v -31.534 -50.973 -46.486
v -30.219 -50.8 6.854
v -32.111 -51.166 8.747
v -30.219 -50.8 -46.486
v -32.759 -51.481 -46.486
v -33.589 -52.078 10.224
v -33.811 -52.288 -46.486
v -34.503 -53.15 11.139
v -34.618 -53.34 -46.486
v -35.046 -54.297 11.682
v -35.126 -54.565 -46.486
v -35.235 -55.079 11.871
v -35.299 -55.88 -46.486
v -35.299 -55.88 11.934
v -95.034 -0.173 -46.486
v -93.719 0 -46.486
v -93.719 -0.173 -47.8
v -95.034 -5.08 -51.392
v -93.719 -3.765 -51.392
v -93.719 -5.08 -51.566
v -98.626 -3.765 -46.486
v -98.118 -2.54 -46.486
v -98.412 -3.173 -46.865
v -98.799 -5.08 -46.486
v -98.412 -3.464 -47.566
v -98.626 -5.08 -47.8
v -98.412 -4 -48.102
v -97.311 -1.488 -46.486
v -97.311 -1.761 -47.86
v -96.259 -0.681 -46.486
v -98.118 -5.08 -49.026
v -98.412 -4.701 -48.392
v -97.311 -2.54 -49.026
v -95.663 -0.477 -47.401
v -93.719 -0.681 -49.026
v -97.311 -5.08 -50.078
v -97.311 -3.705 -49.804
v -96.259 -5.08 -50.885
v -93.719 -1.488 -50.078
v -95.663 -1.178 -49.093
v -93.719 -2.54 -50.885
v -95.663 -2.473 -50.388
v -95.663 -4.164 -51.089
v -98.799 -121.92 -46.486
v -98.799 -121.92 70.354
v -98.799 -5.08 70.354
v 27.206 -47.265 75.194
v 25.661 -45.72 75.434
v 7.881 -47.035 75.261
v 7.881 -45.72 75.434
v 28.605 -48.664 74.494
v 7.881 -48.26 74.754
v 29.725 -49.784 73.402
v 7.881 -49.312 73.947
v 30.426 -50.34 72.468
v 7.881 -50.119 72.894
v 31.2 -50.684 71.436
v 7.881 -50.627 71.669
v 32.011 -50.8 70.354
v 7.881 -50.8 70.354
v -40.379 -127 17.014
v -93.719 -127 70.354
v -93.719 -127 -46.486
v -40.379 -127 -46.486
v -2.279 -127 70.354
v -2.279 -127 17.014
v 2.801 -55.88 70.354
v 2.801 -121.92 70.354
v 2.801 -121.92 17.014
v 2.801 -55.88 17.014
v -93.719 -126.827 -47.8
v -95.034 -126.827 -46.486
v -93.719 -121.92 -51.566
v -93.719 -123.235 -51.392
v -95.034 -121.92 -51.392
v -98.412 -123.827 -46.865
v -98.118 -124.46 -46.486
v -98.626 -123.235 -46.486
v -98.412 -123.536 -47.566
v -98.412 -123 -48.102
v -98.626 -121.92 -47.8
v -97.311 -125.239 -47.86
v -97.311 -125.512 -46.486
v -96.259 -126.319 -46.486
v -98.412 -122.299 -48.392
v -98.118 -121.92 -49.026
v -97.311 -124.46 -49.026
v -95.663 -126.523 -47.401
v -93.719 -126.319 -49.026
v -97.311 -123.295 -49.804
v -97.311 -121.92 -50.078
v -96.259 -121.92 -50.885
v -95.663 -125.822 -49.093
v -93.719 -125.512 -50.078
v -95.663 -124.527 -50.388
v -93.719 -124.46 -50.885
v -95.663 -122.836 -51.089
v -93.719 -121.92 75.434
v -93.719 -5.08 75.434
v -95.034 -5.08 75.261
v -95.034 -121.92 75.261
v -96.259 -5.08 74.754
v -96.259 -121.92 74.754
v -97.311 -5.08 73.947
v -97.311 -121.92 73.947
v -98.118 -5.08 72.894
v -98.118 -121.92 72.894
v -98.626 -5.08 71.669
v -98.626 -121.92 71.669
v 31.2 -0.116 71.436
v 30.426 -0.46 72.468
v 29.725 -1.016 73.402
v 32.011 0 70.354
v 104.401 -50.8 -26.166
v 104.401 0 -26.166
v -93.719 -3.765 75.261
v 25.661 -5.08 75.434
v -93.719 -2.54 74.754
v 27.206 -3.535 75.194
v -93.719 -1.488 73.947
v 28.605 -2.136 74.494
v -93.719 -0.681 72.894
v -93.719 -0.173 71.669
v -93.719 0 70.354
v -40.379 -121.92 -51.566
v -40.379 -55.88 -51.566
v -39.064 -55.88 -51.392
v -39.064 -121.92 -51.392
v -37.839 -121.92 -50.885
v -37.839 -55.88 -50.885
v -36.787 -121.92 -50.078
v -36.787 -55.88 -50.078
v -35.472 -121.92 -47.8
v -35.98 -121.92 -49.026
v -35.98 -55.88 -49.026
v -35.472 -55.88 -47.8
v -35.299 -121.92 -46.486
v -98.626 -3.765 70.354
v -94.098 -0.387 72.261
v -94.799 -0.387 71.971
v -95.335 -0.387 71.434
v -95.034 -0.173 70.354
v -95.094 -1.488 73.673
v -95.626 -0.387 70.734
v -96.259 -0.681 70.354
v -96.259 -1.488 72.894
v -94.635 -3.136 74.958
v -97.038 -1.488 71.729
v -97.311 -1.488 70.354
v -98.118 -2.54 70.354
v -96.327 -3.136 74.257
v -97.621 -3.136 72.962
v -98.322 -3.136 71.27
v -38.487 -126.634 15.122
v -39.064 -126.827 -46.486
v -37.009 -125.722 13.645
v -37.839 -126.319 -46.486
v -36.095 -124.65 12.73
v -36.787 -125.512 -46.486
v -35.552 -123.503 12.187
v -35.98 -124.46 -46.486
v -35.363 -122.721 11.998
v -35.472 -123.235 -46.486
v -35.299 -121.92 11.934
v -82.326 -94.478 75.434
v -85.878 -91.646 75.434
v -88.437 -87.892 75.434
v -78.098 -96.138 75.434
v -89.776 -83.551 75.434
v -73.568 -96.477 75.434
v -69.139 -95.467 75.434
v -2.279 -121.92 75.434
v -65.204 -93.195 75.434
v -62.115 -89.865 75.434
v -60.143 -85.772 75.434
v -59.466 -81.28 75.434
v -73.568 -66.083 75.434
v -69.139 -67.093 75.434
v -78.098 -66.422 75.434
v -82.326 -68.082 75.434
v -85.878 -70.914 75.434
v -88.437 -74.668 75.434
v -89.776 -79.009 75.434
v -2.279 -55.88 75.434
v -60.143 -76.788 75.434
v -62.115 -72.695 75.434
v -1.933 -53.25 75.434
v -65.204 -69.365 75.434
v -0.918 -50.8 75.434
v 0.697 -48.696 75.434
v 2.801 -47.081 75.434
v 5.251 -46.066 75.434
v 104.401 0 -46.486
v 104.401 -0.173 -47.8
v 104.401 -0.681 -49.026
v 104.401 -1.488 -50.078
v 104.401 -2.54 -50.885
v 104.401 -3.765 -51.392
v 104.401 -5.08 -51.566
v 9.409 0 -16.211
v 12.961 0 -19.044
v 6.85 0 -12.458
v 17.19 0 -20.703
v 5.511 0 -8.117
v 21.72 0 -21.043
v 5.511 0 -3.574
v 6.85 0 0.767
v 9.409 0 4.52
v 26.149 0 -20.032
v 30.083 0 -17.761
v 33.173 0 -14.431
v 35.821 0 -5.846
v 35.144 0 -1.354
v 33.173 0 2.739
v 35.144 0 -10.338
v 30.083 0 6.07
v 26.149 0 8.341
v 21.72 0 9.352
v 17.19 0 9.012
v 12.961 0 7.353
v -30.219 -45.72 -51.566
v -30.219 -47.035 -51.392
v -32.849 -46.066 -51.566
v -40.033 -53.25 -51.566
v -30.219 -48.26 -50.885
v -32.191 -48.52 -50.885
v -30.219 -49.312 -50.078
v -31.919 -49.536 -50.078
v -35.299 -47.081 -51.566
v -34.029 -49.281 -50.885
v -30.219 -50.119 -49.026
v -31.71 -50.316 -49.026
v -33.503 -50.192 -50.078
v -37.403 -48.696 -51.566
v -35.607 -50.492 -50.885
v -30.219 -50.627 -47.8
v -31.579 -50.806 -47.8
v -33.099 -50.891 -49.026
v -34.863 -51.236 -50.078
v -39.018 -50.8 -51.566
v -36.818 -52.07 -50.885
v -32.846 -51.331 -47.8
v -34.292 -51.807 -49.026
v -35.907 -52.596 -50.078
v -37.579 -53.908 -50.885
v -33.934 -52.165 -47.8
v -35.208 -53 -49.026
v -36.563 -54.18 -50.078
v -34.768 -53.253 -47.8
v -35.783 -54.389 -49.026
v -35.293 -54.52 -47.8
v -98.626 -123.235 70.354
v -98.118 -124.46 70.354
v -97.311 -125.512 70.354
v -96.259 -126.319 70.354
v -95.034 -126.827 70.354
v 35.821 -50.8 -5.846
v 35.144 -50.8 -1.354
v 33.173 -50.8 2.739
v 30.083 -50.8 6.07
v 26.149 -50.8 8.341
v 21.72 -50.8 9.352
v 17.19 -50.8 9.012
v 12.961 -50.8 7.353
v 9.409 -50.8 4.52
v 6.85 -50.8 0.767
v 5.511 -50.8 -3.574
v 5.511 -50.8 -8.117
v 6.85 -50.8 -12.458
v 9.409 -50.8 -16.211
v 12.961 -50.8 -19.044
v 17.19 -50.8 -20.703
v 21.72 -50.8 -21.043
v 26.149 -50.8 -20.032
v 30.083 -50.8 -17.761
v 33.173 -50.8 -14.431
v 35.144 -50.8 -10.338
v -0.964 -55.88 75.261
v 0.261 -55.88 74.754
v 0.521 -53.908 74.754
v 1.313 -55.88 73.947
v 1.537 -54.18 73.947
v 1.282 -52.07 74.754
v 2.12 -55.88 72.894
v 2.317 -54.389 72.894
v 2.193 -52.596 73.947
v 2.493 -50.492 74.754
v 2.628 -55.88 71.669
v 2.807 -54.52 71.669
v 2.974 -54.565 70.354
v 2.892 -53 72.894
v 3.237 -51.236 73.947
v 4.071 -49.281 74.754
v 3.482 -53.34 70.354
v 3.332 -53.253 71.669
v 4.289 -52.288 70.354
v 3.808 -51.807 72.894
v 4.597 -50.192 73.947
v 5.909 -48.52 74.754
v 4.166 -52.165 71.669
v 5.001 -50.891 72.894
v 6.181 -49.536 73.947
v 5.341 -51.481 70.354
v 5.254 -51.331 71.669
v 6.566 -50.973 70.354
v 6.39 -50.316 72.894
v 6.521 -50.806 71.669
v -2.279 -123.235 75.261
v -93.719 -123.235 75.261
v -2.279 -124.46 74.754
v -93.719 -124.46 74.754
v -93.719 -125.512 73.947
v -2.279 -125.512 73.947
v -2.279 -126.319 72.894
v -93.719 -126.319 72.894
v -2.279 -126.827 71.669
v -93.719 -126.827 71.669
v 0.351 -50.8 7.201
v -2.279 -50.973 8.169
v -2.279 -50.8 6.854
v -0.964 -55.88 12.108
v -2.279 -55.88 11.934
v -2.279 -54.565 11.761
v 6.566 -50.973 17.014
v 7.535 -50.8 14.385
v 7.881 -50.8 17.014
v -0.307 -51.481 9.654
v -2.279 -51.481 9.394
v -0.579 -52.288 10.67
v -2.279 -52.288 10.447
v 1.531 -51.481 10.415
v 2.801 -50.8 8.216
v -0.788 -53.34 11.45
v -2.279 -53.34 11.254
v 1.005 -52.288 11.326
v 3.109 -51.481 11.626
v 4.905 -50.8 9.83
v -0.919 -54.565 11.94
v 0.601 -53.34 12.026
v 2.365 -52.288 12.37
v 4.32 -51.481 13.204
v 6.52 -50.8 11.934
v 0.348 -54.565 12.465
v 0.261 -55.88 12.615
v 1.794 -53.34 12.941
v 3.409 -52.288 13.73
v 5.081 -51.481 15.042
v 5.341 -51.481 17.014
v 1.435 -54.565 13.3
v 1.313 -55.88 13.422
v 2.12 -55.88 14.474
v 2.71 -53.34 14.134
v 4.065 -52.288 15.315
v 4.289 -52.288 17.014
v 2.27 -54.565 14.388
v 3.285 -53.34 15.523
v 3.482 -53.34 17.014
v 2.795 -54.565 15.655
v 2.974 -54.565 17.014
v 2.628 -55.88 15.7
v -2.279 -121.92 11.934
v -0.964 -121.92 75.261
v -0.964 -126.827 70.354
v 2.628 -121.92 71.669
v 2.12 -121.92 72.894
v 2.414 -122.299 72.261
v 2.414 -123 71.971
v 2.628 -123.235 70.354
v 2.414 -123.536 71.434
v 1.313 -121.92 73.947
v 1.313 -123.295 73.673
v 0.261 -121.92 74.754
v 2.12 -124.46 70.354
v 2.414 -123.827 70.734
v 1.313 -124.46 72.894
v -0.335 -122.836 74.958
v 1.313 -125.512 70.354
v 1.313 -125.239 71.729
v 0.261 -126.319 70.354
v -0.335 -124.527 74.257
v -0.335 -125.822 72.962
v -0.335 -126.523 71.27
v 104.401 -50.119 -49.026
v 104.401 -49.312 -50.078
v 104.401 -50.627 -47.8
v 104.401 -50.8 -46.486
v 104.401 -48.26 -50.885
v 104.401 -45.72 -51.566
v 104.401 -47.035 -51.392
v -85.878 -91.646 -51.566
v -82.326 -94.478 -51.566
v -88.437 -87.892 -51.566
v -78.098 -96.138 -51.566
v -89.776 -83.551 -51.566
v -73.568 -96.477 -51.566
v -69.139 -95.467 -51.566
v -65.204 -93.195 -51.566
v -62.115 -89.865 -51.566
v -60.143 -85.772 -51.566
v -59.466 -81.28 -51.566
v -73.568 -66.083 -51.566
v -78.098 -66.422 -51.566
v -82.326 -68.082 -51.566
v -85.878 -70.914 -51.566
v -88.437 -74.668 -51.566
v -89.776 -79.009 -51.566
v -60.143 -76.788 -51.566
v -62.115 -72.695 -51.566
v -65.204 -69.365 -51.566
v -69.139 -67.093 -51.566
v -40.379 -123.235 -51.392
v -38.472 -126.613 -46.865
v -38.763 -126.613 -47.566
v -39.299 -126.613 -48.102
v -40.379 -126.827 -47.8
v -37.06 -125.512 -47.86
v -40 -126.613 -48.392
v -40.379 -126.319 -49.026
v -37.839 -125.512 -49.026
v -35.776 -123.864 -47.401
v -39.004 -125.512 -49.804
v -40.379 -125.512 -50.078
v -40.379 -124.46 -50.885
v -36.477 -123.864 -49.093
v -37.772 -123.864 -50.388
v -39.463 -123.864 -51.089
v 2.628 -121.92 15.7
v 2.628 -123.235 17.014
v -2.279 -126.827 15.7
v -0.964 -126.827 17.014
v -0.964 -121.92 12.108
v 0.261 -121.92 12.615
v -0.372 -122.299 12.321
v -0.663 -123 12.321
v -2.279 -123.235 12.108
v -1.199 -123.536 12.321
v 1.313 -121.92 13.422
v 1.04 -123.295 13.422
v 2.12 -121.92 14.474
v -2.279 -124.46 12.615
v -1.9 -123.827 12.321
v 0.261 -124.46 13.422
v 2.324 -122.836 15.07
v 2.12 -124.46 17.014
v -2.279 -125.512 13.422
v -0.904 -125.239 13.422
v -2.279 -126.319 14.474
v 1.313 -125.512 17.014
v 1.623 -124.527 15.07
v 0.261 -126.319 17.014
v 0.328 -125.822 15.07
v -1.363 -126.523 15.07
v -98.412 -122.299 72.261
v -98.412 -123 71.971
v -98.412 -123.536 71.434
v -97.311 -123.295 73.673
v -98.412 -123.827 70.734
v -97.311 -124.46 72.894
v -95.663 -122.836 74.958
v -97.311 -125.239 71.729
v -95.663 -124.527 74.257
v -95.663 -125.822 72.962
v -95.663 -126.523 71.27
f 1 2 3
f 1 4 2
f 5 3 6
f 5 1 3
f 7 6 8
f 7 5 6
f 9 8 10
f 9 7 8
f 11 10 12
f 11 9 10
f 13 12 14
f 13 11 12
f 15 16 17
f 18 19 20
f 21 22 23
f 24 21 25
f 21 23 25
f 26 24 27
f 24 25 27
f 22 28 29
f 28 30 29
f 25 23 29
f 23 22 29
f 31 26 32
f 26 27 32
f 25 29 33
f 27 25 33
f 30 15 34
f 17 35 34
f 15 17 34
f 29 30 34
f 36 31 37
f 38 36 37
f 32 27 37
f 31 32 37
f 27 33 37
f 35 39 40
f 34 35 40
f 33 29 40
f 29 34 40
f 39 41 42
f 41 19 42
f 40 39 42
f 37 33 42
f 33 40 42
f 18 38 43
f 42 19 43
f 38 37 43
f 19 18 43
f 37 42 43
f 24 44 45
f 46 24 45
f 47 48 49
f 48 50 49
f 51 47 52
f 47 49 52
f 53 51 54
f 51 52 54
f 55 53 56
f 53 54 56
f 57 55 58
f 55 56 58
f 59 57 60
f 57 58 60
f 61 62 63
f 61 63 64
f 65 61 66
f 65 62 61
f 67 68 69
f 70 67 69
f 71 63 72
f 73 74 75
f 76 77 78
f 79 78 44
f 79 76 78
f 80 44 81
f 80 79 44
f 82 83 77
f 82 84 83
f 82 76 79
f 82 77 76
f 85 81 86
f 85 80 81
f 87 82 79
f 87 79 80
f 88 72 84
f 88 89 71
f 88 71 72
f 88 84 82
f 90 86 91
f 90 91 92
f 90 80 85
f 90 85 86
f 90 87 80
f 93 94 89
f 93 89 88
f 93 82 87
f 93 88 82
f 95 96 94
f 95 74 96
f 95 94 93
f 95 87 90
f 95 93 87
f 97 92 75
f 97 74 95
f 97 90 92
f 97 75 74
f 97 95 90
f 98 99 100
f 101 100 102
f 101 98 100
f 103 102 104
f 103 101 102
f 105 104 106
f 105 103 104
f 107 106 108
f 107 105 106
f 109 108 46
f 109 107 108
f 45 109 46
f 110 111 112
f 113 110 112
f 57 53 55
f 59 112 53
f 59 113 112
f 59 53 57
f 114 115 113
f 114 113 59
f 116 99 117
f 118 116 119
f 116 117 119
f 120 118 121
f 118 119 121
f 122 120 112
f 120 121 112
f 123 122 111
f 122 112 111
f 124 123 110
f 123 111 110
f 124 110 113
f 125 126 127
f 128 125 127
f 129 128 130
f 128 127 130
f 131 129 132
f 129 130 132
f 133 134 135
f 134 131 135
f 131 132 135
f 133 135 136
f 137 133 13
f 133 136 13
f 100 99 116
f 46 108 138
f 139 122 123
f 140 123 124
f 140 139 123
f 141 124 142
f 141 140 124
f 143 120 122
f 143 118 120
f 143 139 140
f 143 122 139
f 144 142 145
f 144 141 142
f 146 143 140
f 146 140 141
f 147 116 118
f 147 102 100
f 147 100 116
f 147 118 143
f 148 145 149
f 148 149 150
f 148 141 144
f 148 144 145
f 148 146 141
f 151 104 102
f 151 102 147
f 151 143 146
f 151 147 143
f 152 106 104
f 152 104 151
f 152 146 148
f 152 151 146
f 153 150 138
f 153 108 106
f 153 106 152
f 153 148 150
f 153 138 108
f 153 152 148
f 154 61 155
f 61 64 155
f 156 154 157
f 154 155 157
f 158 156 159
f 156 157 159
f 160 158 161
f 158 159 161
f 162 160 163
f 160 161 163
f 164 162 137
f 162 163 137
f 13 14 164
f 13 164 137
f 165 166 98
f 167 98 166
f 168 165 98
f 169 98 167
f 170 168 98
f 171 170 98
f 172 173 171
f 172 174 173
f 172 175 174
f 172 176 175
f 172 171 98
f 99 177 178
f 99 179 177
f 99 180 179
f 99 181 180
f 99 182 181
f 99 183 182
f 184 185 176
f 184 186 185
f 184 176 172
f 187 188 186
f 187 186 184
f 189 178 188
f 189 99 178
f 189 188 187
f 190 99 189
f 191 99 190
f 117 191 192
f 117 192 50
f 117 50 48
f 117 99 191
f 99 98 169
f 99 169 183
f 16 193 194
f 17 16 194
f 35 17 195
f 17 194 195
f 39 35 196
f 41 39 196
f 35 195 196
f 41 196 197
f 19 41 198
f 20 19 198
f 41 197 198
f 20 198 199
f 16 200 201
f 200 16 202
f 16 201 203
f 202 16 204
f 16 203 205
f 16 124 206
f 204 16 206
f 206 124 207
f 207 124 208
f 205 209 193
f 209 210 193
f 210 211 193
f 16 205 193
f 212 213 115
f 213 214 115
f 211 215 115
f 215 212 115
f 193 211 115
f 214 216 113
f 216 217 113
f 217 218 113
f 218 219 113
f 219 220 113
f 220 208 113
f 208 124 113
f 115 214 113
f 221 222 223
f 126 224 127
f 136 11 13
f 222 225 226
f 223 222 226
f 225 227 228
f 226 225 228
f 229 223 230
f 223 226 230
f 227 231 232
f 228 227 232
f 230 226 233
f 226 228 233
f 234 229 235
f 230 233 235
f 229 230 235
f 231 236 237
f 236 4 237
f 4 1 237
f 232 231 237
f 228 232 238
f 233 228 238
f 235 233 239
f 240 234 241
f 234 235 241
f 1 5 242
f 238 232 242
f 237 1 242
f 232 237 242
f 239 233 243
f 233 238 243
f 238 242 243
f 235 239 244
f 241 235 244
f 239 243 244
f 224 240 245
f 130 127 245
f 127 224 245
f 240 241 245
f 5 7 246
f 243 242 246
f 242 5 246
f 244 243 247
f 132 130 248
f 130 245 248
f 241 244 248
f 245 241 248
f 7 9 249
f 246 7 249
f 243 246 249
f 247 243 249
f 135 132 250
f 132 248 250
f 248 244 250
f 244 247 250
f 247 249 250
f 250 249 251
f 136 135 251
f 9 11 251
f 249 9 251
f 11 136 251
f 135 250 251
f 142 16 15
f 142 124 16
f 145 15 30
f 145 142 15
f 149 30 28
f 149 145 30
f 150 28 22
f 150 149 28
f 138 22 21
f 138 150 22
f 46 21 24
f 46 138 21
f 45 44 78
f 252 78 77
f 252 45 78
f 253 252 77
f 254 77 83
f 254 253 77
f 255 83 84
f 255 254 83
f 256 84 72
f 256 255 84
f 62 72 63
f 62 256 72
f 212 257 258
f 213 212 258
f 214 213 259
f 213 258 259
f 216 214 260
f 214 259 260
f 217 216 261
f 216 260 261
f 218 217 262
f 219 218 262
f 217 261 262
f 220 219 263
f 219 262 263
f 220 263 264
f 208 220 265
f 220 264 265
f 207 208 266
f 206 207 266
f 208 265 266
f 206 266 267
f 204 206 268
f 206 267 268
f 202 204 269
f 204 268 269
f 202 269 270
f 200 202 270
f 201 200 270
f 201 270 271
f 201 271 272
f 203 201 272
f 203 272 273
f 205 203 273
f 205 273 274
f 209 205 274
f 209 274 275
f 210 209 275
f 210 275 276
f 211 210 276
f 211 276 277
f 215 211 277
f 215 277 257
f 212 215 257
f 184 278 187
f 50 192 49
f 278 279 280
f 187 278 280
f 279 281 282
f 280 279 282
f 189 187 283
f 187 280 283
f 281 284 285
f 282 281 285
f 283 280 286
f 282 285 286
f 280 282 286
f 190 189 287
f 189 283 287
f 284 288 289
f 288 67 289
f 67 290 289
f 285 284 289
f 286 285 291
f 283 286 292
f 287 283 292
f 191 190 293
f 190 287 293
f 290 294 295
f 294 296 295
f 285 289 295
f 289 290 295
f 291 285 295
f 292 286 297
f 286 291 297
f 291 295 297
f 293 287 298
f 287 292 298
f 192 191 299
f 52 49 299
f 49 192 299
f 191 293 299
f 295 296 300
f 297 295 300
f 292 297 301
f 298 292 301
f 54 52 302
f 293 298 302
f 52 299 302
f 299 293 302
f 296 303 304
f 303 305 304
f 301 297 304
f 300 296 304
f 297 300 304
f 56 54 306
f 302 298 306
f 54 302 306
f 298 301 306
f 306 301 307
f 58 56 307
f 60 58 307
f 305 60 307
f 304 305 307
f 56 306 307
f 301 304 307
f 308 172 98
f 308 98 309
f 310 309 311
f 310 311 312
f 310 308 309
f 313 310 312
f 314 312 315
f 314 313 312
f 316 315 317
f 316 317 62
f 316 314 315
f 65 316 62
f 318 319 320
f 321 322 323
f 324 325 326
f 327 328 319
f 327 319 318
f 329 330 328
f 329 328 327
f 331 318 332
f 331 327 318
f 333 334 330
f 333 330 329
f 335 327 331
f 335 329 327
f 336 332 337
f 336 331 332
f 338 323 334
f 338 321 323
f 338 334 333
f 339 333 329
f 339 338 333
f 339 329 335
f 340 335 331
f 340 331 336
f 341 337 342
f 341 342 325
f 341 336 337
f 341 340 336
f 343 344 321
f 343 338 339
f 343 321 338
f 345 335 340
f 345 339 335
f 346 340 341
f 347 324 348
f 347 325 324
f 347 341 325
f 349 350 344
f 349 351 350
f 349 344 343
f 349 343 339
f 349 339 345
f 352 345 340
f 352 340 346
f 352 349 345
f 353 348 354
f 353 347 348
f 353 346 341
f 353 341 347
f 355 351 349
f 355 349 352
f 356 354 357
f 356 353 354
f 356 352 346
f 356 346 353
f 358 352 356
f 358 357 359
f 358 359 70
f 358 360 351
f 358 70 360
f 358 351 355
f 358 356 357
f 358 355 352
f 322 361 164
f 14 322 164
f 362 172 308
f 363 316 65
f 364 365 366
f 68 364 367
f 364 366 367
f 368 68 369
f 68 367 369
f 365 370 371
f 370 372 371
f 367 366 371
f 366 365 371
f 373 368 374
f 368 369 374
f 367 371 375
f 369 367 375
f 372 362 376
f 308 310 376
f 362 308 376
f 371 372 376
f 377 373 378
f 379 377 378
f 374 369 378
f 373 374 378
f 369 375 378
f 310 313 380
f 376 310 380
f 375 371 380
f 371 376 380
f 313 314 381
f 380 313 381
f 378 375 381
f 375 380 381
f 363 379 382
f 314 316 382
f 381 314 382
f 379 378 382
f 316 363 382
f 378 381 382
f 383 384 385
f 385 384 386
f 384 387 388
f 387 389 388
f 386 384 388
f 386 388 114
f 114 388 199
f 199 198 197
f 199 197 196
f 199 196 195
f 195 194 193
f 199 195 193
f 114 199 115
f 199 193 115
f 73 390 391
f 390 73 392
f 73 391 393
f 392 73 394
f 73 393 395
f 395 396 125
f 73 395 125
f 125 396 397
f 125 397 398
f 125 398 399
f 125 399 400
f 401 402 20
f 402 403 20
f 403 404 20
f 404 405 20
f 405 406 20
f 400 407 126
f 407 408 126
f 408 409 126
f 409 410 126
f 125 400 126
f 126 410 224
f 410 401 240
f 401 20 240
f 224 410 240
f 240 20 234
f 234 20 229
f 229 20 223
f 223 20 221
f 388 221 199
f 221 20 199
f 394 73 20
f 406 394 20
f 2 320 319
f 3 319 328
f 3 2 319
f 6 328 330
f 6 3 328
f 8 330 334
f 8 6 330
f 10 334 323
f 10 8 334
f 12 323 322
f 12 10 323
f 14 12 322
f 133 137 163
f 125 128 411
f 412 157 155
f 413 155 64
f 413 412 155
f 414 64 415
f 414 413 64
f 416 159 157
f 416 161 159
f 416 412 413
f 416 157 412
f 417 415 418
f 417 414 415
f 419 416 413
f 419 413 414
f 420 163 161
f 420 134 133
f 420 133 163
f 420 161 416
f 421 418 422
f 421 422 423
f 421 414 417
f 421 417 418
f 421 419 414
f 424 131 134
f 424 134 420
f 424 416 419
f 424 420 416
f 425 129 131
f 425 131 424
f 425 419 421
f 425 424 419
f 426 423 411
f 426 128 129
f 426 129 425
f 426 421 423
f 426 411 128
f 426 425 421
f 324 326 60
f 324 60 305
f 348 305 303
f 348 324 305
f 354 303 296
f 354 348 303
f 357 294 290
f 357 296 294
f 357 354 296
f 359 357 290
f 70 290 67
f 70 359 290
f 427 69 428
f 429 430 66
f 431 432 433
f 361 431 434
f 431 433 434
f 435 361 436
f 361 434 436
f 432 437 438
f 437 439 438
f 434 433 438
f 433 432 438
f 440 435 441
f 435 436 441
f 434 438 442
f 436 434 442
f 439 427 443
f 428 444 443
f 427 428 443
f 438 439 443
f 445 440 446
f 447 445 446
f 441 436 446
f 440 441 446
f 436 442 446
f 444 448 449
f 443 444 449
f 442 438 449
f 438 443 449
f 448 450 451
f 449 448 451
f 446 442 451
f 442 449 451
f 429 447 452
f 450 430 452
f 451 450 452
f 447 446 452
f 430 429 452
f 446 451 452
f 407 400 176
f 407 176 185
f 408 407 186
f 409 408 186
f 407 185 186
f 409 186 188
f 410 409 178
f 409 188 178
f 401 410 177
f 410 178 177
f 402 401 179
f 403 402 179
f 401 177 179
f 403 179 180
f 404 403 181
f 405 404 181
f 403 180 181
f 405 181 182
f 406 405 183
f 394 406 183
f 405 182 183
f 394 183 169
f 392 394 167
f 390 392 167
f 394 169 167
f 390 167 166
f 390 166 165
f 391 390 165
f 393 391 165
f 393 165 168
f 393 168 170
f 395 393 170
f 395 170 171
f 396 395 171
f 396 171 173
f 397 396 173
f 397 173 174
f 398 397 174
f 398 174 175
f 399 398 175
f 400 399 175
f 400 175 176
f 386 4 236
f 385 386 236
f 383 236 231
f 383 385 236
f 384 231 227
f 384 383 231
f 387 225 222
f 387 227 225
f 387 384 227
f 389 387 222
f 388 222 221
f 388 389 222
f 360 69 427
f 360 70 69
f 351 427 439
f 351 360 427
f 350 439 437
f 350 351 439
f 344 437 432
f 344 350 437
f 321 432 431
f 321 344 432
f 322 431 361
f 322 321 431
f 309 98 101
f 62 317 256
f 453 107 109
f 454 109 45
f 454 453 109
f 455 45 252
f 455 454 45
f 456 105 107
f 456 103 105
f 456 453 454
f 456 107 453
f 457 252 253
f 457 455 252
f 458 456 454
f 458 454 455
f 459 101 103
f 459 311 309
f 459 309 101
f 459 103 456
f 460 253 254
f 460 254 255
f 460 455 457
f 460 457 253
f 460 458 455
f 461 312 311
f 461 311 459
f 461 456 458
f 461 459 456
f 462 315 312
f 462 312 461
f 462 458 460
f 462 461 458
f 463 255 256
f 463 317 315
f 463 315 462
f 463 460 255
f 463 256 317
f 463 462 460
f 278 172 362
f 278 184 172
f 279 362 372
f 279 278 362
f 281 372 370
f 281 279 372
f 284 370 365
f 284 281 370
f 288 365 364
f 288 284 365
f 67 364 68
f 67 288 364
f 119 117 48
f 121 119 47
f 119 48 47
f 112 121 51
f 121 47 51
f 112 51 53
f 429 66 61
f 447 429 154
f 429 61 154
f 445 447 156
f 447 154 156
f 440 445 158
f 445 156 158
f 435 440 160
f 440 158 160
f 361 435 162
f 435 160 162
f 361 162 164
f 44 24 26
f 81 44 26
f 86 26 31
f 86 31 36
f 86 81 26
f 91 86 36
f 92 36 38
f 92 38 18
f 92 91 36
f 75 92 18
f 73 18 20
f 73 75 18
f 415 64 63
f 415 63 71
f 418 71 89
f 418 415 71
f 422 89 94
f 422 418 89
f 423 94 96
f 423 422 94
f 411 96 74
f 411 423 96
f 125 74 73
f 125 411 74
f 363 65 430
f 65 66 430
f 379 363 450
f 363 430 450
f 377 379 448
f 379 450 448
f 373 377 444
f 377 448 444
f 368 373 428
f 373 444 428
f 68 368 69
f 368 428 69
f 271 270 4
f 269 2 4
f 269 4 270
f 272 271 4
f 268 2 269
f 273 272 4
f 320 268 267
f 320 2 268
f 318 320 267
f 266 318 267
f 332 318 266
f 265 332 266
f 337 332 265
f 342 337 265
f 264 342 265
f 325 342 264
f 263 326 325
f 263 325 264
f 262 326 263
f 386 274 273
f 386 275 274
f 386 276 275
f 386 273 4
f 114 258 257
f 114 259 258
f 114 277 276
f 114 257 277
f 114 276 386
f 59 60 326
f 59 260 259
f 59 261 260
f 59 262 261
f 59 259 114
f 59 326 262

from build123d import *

# Parameters (mm, degrees)
F0_W      = 203.2
F0_H      = 127
F1_DEPTH  = 127
F3_DEPTH  = 76.2
F4_SIZE2  = 101.6
F4_SIZE   = 76.2
F5_R      = 5.08
F6_R      = 15.24
F7_DEPTH  = 50.801
F8_R      = 15.24
F10_DEPTH = 127.001


with BuildPart() as f1:
    # F0 (on Front) → F1 (new body)
    with BuildSketch(Plane.XZ):
        with Locations((2.8009600937, 11.9344207702)):
            Rectangle(F0_W, F0_H)
    extrude(amount=F1_DEPTH)

    # F2 (on face) → F3 (cut)
    with BuildSketch(Plane.XZ.offset(127)):
        Polygon((-35.2990399063, 11.9344207702), (-35.2990399063, -51.5655792298), (104.4009600937, -51.5655792298), (104.4009600937, 75.4344207702), (2.8009600937, 75.4344207702), (2.8009600937, 11.9344207702), align=None)
    extrude(amount=-F3_DEPTH, mode=Mode.SUBTRACT)

    # F4
    f4_edges = [f1.edges().sort_by_distance(p)[0] for p in [
        (104.40096, -25.4, 75.434421),
    ]]
    f4_side = f1.faces().sort_by_distance((-18.970468, -52.614286, 75.434421))[0]
    chamfer(f4_edges, length=F4_SIZE, length2=F4_SIZE2, reference=f4_side)

    # F5
    f5_edges = [f1.edges().sort_by_distance(p)[0] for p in [
        (-47.99904, -127, 75.434421),
        (-98.79904, -63.5, 75.434421),
        (-35.29904, 0, 75.434421),
        (2.80096, -88.9, 75.434421),
        (15.50096, -50.8, 75.434421),
        (2.80096, -50.8, 43.684421),
        (2.80096, -127, 43.684421),
        (2.80096, -88.9, 11.934421),
        (-35.29904, -50.8, -19.815579),
        (34.55096, -50.8, -51.565579),
        (-35.29904, -88.9, -51.565579),
        (-35.29904, -127, -19.815579),
        (-67.04904, -127, -51.565579),
        (-98.79904, -127, 11.934421),
        (2.80096, 0, -51.565579),
        (-98.79904, 0, 11.934421),
        (-98.79904, -63.5, -51.565579),
        (28.20096, -25.4, 75.434421),
        (-16.24904, -127, 11.934421),
        (-16.24904, -50.8, 11.934421),
    ]]
    fillet(f5_edges, radius=F5_R)

    # F6 (on face) → F7 (cut, through all)
    with BuildSketch(Plane.XZ.offset(50.8)):
        with Locations((20.5809600937, -5.8455792298)):
            Circle(F6_R)
    extrude(amount=-F7_DEPTH, mode=Mode.SUBTRACT)

    # F8 (on face) → F10 (cut, through all)
    with BuildSketch(Plane.XY.offset(75.4344207702)):
        with Locations((-74.706427753, -81.28)):
            Circle(F8_R)
    extrude(amount=-F10_DEPTH, mode=Mode.SUBTRACT)


solid = f1.part
